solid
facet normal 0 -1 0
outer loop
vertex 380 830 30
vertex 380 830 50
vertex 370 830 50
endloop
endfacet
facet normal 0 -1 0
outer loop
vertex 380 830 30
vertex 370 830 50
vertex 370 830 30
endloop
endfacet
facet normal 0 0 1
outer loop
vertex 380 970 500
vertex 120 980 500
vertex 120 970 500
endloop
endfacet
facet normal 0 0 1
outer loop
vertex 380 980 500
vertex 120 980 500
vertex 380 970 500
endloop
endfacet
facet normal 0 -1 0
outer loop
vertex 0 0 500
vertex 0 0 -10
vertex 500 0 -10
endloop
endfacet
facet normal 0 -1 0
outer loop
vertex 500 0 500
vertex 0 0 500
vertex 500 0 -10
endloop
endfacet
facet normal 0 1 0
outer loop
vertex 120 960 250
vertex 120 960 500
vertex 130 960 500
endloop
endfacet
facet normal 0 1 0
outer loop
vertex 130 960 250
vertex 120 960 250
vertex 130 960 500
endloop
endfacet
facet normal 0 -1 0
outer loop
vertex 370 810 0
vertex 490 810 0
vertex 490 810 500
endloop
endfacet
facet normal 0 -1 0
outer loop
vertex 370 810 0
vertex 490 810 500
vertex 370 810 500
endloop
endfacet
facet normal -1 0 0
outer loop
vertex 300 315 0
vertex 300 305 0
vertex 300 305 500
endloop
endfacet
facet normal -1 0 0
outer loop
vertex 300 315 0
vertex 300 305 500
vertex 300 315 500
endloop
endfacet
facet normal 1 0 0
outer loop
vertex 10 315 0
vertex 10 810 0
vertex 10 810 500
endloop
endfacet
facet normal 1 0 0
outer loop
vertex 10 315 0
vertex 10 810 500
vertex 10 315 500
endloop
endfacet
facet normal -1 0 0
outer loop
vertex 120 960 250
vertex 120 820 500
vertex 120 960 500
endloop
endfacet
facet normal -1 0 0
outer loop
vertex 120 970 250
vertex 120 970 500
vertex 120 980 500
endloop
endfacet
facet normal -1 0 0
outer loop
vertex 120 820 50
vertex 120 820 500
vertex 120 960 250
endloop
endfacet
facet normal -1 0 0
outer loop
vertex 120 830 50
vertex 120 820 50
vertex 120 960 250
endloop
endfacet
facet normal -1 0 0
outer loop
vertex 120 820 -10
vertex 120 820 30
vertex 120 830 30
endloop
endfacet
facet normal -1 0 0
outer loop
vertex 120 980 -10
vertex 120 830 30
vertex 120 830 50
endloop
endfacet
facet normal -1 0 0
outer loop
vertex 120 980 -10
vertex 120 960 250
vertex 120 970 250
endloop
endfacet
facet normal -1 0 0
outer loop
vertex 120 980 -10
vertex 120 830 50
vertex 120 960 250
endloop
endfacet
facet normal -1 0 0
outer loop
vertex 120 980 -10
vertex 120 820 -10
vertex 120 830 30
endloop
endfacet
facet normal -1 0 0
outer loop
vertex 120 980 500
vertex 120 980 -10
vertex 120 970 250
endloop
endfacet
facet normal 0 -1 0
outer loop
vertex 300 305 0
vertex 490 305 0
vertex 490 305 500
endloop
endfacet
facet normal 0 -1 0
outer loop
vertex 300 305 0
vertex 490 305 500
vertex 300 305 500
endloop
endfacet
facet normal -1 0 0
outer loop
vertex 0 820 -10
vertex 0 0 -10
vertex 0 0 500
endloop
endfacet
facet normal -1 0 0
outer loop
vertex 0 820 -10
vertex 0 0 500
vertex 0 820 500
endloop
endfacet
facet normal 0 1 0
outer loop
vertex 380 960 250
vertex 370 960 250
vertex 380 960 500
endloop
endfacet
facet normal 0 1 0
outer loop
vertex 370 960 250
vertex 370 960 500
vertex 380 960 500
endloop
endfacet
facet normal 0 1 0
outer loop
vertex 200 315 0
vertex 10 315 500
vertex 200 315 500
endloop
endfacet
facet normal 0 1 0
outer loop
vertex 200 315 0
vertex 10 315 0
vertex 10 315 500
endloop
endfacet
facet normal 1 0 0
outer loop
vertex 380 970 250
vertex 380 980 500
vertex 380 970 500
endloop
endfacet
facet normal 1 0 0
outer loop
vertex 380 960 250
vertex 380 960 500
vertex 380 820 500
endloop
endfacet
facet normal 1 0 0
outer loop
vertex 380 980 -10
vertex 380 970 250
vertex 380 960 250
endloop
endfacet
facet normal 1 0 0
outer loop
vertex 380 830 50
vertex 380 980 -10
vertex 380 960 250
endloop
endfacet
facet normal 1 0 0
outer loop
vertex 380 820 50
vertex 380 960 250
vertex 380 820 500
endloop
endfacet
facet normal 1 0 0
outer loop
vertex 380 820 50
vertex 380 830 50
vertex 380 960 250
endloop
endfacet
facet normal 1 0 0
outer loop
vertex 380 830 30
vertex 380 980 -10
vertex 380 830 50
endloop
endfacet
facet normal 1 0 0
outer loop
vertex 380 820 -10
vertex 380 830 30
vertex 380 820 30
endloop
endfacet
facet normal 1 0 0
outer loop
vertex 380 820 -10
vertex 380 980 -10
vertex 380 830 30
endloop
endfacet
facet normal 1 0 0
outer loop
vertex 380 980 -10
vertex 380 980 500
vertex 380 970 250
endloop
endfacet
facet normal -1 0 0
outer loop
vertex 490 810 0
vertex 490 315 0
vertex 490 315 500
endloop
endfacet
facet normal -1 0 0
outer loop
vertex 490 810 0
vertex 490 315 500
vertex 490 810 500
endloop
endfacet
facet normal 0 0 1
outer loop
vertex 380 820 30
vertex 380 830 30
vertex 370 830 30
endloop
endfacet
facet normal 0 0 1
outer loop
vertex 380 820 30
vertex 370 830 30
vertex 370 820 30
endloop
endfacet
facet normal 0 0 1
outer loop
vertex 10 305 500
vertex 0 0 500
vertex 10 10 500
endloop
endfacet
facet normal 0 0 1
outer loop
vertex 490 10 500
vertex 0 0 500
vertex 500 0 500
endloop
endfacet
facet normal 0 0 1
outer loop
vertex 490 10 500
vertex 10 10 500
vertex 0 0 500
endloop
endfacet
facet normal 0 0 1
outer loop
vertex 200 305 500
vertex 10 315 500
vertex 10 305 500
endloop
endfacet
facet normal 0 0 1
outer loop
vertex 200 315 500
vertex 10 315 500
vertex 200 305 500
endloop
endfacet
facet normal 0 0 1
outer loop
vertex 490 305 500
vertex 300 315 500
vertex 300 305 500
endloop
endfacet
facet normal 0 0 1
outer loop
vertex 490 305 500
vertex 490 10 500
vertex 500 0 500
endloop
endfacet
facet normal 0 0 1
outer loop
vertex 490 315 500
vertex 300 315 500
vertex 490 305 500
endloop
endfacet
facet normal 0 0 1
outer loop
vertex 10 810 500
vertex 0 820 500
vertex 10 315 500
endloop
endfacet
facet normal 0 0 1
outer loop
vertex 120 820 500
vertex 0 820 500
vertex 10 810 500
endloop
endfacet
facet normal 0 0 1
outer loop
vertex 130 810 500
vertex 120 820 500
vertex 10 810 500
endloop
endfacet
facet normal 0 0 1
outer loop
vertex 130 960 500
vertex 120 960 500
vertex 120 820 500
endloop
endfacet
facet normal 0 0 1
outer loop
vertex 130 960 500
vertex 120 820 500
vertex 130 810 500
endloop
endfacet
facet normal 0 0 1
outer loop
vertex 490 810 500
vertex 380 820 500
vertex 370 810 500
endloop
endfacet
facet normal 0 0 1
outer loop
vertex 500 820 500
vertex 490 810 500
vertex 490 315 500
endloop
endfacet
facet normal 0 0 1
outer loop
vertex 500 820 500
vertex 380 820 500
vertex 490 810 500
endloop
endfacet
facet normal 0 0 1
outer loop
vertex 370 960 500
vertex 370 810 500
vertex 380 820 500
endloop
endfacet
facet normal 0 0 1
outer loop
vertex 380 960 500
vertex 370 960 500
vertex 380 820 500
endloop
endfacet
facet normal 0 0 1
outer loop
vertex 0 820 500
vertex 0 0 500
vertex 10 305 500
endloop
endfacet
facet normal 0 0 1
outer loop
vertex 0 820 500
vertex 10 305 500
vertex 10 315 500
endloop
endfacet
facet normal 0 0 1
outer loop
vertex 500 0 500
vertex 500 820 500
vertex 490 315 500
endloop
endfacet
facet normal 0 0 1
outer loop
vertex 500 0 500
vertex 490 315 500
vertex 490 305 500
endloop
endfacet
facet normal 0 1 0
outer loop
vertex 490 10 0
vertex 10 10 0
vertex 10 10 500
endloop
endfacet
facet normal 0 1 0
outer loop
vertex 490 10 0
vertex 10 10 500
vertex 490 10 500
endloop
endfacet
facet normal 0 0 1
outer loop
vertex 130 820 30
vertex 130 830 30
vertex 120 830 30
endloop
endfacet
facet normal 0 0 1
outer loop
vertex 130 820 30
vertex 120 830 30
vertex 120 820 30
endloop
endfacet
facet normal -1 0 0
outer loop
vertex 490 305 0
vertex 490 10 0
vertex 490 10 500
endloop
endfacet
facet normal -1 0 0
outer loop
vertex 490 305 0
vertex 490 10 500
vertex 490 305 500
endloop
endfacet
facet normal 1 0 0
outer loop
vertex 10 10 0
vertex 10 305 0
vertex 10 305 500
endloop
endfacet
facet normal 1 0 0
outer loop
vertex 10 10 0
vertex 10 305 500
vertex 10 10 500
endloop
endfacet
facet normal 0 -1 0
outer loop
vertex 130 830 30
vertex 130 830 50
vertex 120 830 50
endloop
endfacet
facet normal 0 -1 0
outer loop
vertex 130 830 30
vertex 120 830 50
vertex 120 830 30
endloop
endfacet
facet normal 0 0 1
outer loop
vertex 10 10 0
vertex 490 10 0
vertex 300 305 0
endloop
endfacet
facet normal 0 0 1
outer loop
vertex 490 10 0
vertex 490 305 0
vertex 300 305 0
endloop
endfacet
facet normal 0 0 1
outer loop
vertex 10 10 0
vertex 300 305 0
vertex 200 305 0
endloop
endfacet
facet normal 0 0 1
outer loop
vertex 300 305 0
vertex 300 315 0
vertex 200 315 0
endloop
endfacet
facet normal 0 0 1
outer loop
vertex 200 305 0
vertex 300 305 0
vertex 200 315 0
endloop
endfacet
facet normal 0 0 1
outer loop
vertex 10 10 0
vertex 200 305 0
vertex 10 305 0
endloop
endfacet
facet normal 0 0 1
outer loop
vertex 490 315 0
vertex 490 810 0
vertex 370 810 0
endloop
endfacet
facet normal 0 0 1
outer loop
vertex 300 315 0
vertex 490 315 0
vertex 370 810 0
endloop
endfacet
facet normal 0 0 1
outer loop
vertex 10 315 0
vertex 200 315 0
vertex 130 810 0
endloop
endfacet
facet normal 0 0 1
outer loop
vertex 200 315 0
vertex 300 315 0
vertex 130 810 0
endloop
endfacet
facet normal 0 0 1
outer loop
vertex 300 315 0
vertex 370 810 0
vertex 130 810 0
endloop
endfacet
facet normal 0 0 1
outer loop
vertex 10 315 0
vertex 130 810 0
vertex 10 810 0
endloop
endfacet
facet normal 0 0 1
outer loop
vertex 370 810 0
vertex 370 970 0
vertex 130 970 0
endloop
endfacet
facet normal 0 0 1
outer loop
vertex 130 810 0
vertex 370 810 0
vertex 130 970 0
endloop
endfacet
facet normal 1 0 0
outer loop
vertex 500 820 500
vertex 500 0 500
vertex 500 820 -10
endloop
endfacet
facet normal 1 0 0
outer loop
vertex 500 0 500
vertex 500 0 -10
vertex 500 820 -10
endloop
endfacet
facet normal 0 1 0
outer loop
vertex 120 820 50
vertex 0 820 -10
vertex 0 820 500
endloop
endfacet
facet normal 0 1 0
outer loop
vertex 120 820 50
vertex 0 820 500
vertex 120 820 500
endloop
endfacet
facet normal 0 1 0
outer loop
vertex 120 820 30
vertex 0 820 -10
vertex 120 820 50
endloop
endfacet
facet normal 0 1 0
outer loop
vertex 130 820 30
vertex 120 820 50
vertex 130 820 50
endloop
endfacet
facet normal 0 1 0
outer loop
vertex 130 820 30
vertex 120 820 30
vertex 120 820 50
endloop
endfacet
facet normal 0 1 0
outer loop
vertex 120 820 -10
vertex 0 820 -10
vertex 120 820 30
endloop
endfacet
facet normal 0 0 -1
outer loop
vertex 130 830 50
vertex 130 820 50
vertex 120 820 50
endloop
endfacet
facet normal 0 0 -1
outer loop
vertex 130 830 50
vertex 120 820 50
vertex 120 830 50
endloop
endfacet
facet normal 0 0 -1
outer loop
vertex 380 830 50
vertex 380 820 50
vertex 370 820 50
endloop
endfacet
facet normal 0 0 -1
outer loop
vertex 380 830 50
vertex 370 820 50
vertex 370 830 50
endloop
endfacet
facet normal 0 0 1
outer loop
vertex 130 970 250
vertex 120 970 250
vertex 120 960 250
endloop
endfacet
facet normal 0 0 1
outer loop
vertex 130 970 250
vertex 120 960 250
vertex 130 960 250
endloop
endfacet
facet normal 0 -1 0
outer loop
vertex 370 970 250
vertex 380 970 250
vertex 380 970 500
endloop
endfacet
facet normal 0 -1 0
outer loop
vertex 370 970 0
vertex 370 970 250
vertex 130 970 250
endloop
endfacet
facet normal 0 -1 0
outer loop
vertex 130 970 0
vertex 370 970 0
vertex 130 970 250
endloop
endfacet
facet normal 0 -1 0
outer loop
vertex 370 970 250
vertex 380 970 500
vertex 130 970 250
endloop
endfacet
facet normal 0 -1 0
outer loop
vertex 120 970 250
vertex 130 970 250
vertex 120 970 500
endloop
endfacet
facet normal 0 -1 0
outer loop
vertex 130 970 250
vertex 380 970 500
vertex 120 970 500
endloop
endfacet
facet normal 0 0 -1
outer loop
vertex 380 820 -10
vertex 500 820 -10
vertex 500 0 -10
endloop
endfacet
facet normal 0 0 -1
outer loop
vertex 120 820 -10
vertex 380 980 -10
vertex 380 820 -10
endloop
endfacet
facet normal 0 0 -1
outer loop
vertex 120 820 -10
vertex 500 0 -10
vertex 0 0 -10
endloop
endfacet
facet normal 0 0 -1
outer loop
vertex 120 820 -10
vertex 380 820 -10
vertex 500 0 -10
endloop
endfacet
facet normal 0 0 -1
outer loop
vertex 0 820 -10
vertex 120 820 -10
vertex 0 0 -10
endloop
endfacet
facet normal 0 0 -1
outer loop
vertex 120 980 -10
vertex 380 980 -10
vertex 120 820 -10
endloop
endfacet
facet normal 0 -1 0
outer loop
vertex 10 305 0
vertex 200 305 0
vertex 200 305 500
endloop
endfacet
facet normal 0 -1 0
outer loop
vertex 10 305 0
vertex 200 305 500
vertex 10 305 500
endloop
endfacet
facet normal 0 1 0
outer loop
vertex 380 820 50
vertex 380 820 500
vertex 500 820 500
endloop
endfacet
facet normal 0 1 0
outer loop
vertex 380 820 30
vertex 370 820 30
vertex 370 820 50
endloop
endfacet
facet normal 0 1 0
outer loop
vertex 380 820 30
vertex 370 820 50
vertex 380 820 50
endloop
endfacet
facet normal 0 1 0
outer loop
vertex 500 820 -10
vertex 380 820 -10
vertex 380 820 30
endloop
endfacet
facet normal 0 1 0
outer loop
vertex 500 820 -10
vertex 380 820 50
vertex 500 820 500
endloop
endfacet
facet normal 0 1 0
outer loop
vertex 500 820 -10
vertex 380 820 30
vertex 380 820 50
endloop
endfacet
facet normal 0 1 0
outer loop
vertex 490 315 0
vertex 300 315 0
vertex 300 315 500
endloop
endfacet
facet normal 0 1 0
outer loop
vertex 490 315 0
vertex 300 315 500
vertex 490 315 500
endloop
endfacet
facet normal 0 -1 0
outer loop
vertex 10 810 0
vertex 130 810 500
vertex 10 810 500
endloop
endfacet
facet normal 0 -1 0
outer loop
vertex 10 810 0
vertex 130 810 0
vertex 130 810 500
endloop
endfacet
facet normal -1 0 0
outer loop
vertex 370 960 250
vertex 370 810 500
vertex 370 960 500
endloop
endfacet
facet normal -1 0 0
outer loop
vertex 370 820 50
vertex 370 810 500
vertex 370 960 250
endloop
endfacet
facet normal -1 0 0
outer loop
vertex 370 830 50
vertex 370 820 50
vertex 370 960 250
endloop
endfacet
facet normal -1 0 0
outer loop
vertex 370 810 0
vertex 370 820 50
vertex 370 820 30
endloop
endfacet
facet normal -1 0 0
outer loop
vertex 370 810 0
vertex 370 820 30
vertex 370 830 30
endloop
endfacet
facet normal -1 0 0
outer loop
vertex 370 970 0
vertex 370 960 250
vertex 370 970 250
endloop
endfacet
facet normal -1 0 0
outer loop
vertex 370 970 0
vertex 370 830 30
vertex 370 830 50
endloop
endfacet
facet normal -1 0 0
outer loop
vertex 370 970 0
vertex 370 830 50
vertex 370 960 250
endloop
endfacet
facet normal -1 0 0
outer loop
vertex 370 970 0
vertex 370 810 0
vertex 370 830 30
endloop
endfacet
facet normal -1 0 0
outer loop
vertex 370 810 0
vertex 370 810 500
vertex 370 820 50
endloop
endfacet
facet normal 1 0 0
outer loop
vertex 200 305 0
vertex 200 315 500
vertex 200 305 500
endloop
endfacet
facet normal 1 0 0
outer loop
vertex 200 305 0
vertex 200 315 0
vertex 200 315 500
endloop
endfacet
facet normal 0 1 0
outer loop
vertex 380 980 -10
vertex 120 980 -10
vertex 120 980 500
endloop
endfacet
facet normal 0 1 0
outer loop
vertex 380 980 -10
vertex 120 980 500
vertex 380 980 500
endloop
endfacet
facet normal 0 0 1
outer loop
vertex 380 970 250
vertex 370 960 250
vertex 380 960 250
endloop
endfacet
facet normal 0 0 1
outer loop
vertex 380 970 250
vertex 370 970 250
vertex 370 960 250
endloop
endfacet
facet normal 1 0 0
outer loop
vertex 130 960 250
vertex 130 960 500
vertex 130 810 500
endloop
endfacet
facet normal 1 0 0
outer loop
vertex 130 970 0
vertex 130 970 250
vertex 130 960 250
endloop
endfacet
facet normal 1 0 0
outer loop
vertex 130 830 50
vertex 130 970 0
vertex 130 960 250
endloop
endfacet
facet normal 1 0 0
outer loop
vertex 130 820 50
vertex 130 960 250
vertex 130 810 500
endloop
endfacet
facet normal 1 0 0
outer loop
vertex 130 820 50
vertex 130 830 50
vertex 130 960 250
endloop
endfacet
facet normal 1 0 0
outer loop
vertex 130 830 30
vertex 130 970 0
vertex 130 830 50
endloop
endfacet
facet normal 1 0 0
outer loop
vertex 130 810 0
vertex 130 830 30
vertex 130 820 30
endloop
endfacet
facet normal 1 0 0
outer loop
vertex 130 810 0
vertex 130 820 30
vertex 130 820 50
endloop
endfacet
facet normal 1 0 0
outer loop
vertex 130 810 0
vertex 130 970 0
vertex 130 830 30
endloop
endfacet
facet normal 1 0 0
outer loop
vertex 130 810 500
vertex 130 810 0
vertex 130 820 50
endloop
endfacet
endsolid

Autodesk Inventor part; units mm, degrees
ref_plane "YZ Plane" through (0, 0, 0) normal (1, 0, 0) x (0, 1, 0)
ref_plane "XZ Plane" through (0, 0, 0) normal (0, 1, 0) x (-1, 0, 0)
ref_plane "XY Plane" through (0, 0, 0) normal (0, 0, 1) x (1, 0, 0)
sketch "스케치1" plane through (0, 0, 0) normal (0, 0, 1) x (1, 0, 0)
  line L0 (0, 0) -> (500, 0)
  line L1 (500, 0) -> (500, 820)
  line L2 (0, 0) -> (0, 820)
  line L3 (0, 820) -> (120, 820)
  line L4 (120, 820) -> (120, 980)
  line L5 (120, 980) -> (380, 980)
  line L6 (380, 980) -> (380, 820)
  line L7 (380, 820) -> (500, 820)
  line L8 (10, 10) -> (490, 10)
  line L9 (490, 10) -> (490, 305)
  line L10 (490, 305) -> (300, 305)
  line L11 (300, 305) -> (300, 315)
  line L12 (300, 315) -> (490, 315)
  line L13 (490, 315) -> (490, 810)
  line L14 (490, 810) -> (370, 810)
  line L15 (370, 810) -> (370, 970)
  line L16 (370, 970) -> (130, 970)
  line L17 (130, 970) -> (130, 810)
  line L18 (130, 810) -> (10, 810)
  line L19 (10, 810) -> (10, 315)
  line L20 (10, 315) -> (200, 315)
  line L21 (200, 315) -> (200, 305)
  line L22 (200, 305) -> (10, 305)
  line L23 (10, 305) -> (10, 10)
  dimension "d0" = 500
  dimension "d1" = 820
  dimension "d2" = 820
  dimension "d3" = 10
  dimension "d4" = 10
  dimension "d5" = 10
  dimension "d6" = 10
  dimension "d7" = 10
  dimension "d8" = 10
  dimension "d9" = 10
  dimension "d10" = 10
  dimension "d11" = 100
  dimension "d12" = 295
  dimension "d13" = 240
  dimension "d14" = 160
extrude "돌출1" add sketch "스케치1" along normal blind 500
sketch "스케치2" plane through (0, 0, 0) normal (0, 0, -1) x (-1, 0, 0)
  line L0 (-380, 820) -> (-380, 980) projected
  line L1 (-500, 820) -> (-380, 820) projected
  line L2 (-500, 0) -> (-500, 820) projected
  line L3 (0, 0) -> (-500, 0) projected
  line L4 (0, 820) -> (0, 0) projected
  line L5 (-120, 820) -> (0, 820) projected
  line L6 (-120, 980) -> (-120, 820) projected
  line L7 (-380, 980) -> (-120, 980) projected
  line L8 (-490, 305) -> (-490, 10) projected
  line L9 (-300, 305) -> (-490, 305) projected
  line L10 (-300, 315) -> (-300, 305) projected
  line L11 (-490, 315) -> (-300, 315) projected
  line L12 (-490, 810) -> (-490, 315) projected
  line L13 (-370, 810) -> (-490, 810) projected
  line L14 (-370, 970) -> (-370, 810) projected
  line L15 (-130, 970) -> (-370, 970) projected
  line L16 (-130, 810) -> (-130, 970) projected
  line L17 (-10, 810) -> (-130, 810) projected
  line L18 (-10, 315) -> (-10, 810) projected
  line L19 (-200, 315) -> (-10, 315) projected
  line L20 (-200, 305) -> (-200, 315) projected
  line L21 (-10, 305) -> (-200, 305) projected
  line L22 (-10, 10) -> (-10, 305) projected
  line L23 (-490, 10) -> (-10, 10) projected
extrude "돌출2" add sketch "스케치2" along normal blind 10 contours L0 L7 L6 L5 L4 L3 L2 L1 | L9 L10 L11 L12 L13 L14 L15 L16 L17 L18 L19 L20 L21 L22 L23 L8
sketch "스케치3" plane through (0, 0, 500) normal (0, 0, 1) x (1, 0, 0)
  line L0 (380, 820) -> (380, 980) projected
  line L1 (380, 980) -> (120, 980) projected
  line L2 (120, 980) -> (120, 820) projected
  line L3 (120, 820) -> (0, 820) projected
  line L4 (0, 820) -> (0, 0) projected
  line L5 (0, 0) -> (500, 0) projected
  line L6 (500, 0) -> (500, 820) projected
  line L7 (500, 820) -> (380, 820) projected
  line L8 (490, 305) -> (490, 10) projected
  line L9 (490, 10) -> (10, 10) projected
  line L10 (10, 10) -> (10, 305) projected
  line L11 (10, 305) -> (200, 305) projected
  line L12 (200, 305) -> (200, 315) projected
  line L13 (200, 315) -> (10, 315) projected
  line L14 (10, 315) -> (10, 810) projected
  line L15 (10, 810) -> (130, 810) projected
  line L16 (130, 810) -> (130, 970) projected
  line L17 (130, 970) -> (370, 970) projected
  line L18 (370, 970) -> (370, 810) projected
  line L19 (370, 810) -> (490, 810) projected
  line L20 (490, 810) -> (490, 315) projected
  line L21 (490, 315) -> (300, 315) projected
  line L22 (300, 315) -> (300, 305) projected
  line L23 (300, 305) -> (490, 305) projected
  line L24 (120, 980) -> (120, 820) projected
  line L25 (380, 820) -> (380, 980) projected
  line L26 (120, 960) -> (380, 960)
  line L27 (380, 960) -> (380, 970)
  line L28 (380, 970) -> (120, 970)
  line L29 (120, 970) -> (120, 960)
  line L30 (130, 970) -> (370, 970) projected
  point P0 (370, 960)
  point P1 (130, 960)
  dimension "d19" = 10
extrude "돌출3" cut sketch "스케치3" against normal blind 250 contours L26 L18 L28 L0 | L26 L2 L28 L16
sketch "스케치4" plane through (380, 820, -10) normal (1, 0, 0) x (0, 0, -1)
  line L0 (0, 160) -> (0, 0) projected
  line L1 (0, 0) -> (-510, 0) projected
  line L2 (-40, 0) -> (-60, 0)
  line L3 (-60, 0) -> (-60, 10)
  line L4 (-60, 10) -> (-40, 10)
  line L5 (-40, 10) -> (-40, 0)
  line L6 (-10, -505) -> (-10, -10) projected
  point P0 (-10, -820)
  dimension "d22" = 20
  dimension "d23" = 10
  dimension "d24" = 30
extrude "돌출4" cut sketch "스케치4" against normal through all
properties part number "Main"
